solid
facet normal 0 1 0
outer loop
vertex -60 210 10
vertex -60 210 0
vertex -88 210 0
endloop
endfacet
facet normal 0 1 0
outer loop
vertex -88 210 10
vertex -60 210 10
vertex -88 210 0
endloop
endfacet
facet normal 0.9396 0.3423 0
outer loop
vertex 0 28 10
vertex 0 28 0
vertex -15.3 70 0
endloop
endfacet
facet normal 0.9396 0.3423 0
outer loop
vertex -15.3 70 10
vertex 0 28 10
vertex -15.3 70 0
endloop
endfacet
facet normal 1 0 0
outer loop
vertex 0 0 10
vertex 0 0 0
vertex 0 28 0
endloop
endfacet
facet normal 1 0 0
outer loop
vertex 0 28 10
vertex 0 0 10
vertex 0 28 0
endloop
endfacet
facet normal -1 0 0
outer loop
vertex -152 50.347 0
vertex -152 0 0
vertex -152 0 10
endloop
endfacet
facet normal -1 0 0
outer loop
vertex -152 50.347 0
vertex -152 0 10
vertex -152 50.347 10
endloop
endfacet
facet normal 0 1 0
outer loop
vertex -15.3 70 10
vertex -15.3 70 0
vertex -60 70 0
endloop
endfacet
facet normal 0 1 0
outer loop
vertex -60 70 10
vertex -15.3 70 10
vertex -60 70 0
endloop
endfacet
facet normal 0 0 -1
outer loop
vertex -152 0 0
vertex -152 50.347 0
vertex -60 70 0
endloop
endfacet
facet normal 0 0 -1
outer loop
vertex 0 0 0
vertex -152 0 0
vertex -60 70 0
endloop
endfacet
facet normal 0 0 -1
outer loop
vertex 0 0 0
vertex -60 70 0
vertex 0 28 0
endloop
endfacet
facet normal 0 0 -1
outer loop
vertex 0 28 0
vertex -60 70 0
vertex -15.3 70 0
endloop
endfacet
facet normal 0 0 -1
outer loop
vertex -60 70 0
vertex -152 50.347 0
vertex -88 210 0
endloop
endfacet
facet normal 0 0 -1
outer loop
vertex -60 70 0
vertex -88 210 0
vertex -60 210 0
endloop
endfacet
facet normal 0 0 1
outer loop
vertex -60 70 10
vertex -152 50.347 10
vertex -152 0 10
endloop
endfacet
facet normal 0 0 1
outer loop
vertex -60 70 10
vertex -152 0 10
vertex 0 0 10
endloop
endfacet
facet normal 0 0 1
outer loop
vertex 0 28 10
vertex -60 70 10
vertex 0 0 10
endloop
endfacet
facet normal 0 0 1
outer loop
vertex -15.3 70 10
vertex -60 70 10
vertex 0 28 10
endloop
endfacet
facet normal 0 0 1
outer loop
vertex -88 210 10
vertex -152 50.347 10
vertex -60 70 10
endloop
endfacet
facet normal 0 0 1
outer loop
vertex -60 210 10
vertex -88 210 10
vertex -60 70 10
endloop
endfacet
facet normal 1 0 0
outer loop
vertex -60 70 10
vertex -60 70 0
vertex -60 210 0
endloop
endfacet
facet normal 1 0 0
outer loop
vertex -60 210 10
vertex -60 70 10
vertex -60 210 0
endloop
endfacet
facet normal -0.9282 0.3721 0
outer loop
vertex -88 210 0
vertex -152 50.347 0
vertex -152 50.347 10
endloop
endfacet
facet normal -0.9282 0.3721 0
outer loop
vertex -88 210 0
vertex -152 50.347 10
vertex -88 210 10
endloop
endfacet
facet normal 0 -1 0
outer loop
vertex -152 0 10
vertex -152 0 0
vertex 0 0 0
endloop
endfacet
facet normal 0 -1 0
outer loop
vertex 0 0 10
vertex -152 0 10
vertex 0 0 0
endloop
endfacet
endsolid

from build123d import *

# Parameters (mm, degrees)
Y_KSEKLIK_EKSTR_ZYON1_DEPTH = 10
CUT_EXTRUDE1_DEPTH          = 10


with BuildPart() as part:
    # Çizim1 → Yükseklik-Ekstrüzyon1 (new body)
    with BuildSketch(Plane.XY):
        Polygon((-210, 28), (-210, 0), (0, 0), (0, 28), (-15.3, 70), (-60, 70), (-60, 210), (-88, 210), align=None)
    extrude(amount=Y_KSEKLIK_EKSTR_ZYON1_DEPTH)

    # Sketch1 → Cut-Extrude1 (cut)
    with BuildSketch(Plane(origin=(0, 0, 0), x_dir=(-1, 0, 0), z_dir=(0, 0, -1))):
        Polygon((152, 150.469052626), (245.176581689, 150.469052626), (245.176581689, -14.338775046), (152, -14.338775046), (152, 50.347137768), (88, 210), (152, 210), align=None)
    extrude(amount=-CUT_EXTRUDE1_DEPTH, mode=Mode.SUBTRACT)


solid = part.part
